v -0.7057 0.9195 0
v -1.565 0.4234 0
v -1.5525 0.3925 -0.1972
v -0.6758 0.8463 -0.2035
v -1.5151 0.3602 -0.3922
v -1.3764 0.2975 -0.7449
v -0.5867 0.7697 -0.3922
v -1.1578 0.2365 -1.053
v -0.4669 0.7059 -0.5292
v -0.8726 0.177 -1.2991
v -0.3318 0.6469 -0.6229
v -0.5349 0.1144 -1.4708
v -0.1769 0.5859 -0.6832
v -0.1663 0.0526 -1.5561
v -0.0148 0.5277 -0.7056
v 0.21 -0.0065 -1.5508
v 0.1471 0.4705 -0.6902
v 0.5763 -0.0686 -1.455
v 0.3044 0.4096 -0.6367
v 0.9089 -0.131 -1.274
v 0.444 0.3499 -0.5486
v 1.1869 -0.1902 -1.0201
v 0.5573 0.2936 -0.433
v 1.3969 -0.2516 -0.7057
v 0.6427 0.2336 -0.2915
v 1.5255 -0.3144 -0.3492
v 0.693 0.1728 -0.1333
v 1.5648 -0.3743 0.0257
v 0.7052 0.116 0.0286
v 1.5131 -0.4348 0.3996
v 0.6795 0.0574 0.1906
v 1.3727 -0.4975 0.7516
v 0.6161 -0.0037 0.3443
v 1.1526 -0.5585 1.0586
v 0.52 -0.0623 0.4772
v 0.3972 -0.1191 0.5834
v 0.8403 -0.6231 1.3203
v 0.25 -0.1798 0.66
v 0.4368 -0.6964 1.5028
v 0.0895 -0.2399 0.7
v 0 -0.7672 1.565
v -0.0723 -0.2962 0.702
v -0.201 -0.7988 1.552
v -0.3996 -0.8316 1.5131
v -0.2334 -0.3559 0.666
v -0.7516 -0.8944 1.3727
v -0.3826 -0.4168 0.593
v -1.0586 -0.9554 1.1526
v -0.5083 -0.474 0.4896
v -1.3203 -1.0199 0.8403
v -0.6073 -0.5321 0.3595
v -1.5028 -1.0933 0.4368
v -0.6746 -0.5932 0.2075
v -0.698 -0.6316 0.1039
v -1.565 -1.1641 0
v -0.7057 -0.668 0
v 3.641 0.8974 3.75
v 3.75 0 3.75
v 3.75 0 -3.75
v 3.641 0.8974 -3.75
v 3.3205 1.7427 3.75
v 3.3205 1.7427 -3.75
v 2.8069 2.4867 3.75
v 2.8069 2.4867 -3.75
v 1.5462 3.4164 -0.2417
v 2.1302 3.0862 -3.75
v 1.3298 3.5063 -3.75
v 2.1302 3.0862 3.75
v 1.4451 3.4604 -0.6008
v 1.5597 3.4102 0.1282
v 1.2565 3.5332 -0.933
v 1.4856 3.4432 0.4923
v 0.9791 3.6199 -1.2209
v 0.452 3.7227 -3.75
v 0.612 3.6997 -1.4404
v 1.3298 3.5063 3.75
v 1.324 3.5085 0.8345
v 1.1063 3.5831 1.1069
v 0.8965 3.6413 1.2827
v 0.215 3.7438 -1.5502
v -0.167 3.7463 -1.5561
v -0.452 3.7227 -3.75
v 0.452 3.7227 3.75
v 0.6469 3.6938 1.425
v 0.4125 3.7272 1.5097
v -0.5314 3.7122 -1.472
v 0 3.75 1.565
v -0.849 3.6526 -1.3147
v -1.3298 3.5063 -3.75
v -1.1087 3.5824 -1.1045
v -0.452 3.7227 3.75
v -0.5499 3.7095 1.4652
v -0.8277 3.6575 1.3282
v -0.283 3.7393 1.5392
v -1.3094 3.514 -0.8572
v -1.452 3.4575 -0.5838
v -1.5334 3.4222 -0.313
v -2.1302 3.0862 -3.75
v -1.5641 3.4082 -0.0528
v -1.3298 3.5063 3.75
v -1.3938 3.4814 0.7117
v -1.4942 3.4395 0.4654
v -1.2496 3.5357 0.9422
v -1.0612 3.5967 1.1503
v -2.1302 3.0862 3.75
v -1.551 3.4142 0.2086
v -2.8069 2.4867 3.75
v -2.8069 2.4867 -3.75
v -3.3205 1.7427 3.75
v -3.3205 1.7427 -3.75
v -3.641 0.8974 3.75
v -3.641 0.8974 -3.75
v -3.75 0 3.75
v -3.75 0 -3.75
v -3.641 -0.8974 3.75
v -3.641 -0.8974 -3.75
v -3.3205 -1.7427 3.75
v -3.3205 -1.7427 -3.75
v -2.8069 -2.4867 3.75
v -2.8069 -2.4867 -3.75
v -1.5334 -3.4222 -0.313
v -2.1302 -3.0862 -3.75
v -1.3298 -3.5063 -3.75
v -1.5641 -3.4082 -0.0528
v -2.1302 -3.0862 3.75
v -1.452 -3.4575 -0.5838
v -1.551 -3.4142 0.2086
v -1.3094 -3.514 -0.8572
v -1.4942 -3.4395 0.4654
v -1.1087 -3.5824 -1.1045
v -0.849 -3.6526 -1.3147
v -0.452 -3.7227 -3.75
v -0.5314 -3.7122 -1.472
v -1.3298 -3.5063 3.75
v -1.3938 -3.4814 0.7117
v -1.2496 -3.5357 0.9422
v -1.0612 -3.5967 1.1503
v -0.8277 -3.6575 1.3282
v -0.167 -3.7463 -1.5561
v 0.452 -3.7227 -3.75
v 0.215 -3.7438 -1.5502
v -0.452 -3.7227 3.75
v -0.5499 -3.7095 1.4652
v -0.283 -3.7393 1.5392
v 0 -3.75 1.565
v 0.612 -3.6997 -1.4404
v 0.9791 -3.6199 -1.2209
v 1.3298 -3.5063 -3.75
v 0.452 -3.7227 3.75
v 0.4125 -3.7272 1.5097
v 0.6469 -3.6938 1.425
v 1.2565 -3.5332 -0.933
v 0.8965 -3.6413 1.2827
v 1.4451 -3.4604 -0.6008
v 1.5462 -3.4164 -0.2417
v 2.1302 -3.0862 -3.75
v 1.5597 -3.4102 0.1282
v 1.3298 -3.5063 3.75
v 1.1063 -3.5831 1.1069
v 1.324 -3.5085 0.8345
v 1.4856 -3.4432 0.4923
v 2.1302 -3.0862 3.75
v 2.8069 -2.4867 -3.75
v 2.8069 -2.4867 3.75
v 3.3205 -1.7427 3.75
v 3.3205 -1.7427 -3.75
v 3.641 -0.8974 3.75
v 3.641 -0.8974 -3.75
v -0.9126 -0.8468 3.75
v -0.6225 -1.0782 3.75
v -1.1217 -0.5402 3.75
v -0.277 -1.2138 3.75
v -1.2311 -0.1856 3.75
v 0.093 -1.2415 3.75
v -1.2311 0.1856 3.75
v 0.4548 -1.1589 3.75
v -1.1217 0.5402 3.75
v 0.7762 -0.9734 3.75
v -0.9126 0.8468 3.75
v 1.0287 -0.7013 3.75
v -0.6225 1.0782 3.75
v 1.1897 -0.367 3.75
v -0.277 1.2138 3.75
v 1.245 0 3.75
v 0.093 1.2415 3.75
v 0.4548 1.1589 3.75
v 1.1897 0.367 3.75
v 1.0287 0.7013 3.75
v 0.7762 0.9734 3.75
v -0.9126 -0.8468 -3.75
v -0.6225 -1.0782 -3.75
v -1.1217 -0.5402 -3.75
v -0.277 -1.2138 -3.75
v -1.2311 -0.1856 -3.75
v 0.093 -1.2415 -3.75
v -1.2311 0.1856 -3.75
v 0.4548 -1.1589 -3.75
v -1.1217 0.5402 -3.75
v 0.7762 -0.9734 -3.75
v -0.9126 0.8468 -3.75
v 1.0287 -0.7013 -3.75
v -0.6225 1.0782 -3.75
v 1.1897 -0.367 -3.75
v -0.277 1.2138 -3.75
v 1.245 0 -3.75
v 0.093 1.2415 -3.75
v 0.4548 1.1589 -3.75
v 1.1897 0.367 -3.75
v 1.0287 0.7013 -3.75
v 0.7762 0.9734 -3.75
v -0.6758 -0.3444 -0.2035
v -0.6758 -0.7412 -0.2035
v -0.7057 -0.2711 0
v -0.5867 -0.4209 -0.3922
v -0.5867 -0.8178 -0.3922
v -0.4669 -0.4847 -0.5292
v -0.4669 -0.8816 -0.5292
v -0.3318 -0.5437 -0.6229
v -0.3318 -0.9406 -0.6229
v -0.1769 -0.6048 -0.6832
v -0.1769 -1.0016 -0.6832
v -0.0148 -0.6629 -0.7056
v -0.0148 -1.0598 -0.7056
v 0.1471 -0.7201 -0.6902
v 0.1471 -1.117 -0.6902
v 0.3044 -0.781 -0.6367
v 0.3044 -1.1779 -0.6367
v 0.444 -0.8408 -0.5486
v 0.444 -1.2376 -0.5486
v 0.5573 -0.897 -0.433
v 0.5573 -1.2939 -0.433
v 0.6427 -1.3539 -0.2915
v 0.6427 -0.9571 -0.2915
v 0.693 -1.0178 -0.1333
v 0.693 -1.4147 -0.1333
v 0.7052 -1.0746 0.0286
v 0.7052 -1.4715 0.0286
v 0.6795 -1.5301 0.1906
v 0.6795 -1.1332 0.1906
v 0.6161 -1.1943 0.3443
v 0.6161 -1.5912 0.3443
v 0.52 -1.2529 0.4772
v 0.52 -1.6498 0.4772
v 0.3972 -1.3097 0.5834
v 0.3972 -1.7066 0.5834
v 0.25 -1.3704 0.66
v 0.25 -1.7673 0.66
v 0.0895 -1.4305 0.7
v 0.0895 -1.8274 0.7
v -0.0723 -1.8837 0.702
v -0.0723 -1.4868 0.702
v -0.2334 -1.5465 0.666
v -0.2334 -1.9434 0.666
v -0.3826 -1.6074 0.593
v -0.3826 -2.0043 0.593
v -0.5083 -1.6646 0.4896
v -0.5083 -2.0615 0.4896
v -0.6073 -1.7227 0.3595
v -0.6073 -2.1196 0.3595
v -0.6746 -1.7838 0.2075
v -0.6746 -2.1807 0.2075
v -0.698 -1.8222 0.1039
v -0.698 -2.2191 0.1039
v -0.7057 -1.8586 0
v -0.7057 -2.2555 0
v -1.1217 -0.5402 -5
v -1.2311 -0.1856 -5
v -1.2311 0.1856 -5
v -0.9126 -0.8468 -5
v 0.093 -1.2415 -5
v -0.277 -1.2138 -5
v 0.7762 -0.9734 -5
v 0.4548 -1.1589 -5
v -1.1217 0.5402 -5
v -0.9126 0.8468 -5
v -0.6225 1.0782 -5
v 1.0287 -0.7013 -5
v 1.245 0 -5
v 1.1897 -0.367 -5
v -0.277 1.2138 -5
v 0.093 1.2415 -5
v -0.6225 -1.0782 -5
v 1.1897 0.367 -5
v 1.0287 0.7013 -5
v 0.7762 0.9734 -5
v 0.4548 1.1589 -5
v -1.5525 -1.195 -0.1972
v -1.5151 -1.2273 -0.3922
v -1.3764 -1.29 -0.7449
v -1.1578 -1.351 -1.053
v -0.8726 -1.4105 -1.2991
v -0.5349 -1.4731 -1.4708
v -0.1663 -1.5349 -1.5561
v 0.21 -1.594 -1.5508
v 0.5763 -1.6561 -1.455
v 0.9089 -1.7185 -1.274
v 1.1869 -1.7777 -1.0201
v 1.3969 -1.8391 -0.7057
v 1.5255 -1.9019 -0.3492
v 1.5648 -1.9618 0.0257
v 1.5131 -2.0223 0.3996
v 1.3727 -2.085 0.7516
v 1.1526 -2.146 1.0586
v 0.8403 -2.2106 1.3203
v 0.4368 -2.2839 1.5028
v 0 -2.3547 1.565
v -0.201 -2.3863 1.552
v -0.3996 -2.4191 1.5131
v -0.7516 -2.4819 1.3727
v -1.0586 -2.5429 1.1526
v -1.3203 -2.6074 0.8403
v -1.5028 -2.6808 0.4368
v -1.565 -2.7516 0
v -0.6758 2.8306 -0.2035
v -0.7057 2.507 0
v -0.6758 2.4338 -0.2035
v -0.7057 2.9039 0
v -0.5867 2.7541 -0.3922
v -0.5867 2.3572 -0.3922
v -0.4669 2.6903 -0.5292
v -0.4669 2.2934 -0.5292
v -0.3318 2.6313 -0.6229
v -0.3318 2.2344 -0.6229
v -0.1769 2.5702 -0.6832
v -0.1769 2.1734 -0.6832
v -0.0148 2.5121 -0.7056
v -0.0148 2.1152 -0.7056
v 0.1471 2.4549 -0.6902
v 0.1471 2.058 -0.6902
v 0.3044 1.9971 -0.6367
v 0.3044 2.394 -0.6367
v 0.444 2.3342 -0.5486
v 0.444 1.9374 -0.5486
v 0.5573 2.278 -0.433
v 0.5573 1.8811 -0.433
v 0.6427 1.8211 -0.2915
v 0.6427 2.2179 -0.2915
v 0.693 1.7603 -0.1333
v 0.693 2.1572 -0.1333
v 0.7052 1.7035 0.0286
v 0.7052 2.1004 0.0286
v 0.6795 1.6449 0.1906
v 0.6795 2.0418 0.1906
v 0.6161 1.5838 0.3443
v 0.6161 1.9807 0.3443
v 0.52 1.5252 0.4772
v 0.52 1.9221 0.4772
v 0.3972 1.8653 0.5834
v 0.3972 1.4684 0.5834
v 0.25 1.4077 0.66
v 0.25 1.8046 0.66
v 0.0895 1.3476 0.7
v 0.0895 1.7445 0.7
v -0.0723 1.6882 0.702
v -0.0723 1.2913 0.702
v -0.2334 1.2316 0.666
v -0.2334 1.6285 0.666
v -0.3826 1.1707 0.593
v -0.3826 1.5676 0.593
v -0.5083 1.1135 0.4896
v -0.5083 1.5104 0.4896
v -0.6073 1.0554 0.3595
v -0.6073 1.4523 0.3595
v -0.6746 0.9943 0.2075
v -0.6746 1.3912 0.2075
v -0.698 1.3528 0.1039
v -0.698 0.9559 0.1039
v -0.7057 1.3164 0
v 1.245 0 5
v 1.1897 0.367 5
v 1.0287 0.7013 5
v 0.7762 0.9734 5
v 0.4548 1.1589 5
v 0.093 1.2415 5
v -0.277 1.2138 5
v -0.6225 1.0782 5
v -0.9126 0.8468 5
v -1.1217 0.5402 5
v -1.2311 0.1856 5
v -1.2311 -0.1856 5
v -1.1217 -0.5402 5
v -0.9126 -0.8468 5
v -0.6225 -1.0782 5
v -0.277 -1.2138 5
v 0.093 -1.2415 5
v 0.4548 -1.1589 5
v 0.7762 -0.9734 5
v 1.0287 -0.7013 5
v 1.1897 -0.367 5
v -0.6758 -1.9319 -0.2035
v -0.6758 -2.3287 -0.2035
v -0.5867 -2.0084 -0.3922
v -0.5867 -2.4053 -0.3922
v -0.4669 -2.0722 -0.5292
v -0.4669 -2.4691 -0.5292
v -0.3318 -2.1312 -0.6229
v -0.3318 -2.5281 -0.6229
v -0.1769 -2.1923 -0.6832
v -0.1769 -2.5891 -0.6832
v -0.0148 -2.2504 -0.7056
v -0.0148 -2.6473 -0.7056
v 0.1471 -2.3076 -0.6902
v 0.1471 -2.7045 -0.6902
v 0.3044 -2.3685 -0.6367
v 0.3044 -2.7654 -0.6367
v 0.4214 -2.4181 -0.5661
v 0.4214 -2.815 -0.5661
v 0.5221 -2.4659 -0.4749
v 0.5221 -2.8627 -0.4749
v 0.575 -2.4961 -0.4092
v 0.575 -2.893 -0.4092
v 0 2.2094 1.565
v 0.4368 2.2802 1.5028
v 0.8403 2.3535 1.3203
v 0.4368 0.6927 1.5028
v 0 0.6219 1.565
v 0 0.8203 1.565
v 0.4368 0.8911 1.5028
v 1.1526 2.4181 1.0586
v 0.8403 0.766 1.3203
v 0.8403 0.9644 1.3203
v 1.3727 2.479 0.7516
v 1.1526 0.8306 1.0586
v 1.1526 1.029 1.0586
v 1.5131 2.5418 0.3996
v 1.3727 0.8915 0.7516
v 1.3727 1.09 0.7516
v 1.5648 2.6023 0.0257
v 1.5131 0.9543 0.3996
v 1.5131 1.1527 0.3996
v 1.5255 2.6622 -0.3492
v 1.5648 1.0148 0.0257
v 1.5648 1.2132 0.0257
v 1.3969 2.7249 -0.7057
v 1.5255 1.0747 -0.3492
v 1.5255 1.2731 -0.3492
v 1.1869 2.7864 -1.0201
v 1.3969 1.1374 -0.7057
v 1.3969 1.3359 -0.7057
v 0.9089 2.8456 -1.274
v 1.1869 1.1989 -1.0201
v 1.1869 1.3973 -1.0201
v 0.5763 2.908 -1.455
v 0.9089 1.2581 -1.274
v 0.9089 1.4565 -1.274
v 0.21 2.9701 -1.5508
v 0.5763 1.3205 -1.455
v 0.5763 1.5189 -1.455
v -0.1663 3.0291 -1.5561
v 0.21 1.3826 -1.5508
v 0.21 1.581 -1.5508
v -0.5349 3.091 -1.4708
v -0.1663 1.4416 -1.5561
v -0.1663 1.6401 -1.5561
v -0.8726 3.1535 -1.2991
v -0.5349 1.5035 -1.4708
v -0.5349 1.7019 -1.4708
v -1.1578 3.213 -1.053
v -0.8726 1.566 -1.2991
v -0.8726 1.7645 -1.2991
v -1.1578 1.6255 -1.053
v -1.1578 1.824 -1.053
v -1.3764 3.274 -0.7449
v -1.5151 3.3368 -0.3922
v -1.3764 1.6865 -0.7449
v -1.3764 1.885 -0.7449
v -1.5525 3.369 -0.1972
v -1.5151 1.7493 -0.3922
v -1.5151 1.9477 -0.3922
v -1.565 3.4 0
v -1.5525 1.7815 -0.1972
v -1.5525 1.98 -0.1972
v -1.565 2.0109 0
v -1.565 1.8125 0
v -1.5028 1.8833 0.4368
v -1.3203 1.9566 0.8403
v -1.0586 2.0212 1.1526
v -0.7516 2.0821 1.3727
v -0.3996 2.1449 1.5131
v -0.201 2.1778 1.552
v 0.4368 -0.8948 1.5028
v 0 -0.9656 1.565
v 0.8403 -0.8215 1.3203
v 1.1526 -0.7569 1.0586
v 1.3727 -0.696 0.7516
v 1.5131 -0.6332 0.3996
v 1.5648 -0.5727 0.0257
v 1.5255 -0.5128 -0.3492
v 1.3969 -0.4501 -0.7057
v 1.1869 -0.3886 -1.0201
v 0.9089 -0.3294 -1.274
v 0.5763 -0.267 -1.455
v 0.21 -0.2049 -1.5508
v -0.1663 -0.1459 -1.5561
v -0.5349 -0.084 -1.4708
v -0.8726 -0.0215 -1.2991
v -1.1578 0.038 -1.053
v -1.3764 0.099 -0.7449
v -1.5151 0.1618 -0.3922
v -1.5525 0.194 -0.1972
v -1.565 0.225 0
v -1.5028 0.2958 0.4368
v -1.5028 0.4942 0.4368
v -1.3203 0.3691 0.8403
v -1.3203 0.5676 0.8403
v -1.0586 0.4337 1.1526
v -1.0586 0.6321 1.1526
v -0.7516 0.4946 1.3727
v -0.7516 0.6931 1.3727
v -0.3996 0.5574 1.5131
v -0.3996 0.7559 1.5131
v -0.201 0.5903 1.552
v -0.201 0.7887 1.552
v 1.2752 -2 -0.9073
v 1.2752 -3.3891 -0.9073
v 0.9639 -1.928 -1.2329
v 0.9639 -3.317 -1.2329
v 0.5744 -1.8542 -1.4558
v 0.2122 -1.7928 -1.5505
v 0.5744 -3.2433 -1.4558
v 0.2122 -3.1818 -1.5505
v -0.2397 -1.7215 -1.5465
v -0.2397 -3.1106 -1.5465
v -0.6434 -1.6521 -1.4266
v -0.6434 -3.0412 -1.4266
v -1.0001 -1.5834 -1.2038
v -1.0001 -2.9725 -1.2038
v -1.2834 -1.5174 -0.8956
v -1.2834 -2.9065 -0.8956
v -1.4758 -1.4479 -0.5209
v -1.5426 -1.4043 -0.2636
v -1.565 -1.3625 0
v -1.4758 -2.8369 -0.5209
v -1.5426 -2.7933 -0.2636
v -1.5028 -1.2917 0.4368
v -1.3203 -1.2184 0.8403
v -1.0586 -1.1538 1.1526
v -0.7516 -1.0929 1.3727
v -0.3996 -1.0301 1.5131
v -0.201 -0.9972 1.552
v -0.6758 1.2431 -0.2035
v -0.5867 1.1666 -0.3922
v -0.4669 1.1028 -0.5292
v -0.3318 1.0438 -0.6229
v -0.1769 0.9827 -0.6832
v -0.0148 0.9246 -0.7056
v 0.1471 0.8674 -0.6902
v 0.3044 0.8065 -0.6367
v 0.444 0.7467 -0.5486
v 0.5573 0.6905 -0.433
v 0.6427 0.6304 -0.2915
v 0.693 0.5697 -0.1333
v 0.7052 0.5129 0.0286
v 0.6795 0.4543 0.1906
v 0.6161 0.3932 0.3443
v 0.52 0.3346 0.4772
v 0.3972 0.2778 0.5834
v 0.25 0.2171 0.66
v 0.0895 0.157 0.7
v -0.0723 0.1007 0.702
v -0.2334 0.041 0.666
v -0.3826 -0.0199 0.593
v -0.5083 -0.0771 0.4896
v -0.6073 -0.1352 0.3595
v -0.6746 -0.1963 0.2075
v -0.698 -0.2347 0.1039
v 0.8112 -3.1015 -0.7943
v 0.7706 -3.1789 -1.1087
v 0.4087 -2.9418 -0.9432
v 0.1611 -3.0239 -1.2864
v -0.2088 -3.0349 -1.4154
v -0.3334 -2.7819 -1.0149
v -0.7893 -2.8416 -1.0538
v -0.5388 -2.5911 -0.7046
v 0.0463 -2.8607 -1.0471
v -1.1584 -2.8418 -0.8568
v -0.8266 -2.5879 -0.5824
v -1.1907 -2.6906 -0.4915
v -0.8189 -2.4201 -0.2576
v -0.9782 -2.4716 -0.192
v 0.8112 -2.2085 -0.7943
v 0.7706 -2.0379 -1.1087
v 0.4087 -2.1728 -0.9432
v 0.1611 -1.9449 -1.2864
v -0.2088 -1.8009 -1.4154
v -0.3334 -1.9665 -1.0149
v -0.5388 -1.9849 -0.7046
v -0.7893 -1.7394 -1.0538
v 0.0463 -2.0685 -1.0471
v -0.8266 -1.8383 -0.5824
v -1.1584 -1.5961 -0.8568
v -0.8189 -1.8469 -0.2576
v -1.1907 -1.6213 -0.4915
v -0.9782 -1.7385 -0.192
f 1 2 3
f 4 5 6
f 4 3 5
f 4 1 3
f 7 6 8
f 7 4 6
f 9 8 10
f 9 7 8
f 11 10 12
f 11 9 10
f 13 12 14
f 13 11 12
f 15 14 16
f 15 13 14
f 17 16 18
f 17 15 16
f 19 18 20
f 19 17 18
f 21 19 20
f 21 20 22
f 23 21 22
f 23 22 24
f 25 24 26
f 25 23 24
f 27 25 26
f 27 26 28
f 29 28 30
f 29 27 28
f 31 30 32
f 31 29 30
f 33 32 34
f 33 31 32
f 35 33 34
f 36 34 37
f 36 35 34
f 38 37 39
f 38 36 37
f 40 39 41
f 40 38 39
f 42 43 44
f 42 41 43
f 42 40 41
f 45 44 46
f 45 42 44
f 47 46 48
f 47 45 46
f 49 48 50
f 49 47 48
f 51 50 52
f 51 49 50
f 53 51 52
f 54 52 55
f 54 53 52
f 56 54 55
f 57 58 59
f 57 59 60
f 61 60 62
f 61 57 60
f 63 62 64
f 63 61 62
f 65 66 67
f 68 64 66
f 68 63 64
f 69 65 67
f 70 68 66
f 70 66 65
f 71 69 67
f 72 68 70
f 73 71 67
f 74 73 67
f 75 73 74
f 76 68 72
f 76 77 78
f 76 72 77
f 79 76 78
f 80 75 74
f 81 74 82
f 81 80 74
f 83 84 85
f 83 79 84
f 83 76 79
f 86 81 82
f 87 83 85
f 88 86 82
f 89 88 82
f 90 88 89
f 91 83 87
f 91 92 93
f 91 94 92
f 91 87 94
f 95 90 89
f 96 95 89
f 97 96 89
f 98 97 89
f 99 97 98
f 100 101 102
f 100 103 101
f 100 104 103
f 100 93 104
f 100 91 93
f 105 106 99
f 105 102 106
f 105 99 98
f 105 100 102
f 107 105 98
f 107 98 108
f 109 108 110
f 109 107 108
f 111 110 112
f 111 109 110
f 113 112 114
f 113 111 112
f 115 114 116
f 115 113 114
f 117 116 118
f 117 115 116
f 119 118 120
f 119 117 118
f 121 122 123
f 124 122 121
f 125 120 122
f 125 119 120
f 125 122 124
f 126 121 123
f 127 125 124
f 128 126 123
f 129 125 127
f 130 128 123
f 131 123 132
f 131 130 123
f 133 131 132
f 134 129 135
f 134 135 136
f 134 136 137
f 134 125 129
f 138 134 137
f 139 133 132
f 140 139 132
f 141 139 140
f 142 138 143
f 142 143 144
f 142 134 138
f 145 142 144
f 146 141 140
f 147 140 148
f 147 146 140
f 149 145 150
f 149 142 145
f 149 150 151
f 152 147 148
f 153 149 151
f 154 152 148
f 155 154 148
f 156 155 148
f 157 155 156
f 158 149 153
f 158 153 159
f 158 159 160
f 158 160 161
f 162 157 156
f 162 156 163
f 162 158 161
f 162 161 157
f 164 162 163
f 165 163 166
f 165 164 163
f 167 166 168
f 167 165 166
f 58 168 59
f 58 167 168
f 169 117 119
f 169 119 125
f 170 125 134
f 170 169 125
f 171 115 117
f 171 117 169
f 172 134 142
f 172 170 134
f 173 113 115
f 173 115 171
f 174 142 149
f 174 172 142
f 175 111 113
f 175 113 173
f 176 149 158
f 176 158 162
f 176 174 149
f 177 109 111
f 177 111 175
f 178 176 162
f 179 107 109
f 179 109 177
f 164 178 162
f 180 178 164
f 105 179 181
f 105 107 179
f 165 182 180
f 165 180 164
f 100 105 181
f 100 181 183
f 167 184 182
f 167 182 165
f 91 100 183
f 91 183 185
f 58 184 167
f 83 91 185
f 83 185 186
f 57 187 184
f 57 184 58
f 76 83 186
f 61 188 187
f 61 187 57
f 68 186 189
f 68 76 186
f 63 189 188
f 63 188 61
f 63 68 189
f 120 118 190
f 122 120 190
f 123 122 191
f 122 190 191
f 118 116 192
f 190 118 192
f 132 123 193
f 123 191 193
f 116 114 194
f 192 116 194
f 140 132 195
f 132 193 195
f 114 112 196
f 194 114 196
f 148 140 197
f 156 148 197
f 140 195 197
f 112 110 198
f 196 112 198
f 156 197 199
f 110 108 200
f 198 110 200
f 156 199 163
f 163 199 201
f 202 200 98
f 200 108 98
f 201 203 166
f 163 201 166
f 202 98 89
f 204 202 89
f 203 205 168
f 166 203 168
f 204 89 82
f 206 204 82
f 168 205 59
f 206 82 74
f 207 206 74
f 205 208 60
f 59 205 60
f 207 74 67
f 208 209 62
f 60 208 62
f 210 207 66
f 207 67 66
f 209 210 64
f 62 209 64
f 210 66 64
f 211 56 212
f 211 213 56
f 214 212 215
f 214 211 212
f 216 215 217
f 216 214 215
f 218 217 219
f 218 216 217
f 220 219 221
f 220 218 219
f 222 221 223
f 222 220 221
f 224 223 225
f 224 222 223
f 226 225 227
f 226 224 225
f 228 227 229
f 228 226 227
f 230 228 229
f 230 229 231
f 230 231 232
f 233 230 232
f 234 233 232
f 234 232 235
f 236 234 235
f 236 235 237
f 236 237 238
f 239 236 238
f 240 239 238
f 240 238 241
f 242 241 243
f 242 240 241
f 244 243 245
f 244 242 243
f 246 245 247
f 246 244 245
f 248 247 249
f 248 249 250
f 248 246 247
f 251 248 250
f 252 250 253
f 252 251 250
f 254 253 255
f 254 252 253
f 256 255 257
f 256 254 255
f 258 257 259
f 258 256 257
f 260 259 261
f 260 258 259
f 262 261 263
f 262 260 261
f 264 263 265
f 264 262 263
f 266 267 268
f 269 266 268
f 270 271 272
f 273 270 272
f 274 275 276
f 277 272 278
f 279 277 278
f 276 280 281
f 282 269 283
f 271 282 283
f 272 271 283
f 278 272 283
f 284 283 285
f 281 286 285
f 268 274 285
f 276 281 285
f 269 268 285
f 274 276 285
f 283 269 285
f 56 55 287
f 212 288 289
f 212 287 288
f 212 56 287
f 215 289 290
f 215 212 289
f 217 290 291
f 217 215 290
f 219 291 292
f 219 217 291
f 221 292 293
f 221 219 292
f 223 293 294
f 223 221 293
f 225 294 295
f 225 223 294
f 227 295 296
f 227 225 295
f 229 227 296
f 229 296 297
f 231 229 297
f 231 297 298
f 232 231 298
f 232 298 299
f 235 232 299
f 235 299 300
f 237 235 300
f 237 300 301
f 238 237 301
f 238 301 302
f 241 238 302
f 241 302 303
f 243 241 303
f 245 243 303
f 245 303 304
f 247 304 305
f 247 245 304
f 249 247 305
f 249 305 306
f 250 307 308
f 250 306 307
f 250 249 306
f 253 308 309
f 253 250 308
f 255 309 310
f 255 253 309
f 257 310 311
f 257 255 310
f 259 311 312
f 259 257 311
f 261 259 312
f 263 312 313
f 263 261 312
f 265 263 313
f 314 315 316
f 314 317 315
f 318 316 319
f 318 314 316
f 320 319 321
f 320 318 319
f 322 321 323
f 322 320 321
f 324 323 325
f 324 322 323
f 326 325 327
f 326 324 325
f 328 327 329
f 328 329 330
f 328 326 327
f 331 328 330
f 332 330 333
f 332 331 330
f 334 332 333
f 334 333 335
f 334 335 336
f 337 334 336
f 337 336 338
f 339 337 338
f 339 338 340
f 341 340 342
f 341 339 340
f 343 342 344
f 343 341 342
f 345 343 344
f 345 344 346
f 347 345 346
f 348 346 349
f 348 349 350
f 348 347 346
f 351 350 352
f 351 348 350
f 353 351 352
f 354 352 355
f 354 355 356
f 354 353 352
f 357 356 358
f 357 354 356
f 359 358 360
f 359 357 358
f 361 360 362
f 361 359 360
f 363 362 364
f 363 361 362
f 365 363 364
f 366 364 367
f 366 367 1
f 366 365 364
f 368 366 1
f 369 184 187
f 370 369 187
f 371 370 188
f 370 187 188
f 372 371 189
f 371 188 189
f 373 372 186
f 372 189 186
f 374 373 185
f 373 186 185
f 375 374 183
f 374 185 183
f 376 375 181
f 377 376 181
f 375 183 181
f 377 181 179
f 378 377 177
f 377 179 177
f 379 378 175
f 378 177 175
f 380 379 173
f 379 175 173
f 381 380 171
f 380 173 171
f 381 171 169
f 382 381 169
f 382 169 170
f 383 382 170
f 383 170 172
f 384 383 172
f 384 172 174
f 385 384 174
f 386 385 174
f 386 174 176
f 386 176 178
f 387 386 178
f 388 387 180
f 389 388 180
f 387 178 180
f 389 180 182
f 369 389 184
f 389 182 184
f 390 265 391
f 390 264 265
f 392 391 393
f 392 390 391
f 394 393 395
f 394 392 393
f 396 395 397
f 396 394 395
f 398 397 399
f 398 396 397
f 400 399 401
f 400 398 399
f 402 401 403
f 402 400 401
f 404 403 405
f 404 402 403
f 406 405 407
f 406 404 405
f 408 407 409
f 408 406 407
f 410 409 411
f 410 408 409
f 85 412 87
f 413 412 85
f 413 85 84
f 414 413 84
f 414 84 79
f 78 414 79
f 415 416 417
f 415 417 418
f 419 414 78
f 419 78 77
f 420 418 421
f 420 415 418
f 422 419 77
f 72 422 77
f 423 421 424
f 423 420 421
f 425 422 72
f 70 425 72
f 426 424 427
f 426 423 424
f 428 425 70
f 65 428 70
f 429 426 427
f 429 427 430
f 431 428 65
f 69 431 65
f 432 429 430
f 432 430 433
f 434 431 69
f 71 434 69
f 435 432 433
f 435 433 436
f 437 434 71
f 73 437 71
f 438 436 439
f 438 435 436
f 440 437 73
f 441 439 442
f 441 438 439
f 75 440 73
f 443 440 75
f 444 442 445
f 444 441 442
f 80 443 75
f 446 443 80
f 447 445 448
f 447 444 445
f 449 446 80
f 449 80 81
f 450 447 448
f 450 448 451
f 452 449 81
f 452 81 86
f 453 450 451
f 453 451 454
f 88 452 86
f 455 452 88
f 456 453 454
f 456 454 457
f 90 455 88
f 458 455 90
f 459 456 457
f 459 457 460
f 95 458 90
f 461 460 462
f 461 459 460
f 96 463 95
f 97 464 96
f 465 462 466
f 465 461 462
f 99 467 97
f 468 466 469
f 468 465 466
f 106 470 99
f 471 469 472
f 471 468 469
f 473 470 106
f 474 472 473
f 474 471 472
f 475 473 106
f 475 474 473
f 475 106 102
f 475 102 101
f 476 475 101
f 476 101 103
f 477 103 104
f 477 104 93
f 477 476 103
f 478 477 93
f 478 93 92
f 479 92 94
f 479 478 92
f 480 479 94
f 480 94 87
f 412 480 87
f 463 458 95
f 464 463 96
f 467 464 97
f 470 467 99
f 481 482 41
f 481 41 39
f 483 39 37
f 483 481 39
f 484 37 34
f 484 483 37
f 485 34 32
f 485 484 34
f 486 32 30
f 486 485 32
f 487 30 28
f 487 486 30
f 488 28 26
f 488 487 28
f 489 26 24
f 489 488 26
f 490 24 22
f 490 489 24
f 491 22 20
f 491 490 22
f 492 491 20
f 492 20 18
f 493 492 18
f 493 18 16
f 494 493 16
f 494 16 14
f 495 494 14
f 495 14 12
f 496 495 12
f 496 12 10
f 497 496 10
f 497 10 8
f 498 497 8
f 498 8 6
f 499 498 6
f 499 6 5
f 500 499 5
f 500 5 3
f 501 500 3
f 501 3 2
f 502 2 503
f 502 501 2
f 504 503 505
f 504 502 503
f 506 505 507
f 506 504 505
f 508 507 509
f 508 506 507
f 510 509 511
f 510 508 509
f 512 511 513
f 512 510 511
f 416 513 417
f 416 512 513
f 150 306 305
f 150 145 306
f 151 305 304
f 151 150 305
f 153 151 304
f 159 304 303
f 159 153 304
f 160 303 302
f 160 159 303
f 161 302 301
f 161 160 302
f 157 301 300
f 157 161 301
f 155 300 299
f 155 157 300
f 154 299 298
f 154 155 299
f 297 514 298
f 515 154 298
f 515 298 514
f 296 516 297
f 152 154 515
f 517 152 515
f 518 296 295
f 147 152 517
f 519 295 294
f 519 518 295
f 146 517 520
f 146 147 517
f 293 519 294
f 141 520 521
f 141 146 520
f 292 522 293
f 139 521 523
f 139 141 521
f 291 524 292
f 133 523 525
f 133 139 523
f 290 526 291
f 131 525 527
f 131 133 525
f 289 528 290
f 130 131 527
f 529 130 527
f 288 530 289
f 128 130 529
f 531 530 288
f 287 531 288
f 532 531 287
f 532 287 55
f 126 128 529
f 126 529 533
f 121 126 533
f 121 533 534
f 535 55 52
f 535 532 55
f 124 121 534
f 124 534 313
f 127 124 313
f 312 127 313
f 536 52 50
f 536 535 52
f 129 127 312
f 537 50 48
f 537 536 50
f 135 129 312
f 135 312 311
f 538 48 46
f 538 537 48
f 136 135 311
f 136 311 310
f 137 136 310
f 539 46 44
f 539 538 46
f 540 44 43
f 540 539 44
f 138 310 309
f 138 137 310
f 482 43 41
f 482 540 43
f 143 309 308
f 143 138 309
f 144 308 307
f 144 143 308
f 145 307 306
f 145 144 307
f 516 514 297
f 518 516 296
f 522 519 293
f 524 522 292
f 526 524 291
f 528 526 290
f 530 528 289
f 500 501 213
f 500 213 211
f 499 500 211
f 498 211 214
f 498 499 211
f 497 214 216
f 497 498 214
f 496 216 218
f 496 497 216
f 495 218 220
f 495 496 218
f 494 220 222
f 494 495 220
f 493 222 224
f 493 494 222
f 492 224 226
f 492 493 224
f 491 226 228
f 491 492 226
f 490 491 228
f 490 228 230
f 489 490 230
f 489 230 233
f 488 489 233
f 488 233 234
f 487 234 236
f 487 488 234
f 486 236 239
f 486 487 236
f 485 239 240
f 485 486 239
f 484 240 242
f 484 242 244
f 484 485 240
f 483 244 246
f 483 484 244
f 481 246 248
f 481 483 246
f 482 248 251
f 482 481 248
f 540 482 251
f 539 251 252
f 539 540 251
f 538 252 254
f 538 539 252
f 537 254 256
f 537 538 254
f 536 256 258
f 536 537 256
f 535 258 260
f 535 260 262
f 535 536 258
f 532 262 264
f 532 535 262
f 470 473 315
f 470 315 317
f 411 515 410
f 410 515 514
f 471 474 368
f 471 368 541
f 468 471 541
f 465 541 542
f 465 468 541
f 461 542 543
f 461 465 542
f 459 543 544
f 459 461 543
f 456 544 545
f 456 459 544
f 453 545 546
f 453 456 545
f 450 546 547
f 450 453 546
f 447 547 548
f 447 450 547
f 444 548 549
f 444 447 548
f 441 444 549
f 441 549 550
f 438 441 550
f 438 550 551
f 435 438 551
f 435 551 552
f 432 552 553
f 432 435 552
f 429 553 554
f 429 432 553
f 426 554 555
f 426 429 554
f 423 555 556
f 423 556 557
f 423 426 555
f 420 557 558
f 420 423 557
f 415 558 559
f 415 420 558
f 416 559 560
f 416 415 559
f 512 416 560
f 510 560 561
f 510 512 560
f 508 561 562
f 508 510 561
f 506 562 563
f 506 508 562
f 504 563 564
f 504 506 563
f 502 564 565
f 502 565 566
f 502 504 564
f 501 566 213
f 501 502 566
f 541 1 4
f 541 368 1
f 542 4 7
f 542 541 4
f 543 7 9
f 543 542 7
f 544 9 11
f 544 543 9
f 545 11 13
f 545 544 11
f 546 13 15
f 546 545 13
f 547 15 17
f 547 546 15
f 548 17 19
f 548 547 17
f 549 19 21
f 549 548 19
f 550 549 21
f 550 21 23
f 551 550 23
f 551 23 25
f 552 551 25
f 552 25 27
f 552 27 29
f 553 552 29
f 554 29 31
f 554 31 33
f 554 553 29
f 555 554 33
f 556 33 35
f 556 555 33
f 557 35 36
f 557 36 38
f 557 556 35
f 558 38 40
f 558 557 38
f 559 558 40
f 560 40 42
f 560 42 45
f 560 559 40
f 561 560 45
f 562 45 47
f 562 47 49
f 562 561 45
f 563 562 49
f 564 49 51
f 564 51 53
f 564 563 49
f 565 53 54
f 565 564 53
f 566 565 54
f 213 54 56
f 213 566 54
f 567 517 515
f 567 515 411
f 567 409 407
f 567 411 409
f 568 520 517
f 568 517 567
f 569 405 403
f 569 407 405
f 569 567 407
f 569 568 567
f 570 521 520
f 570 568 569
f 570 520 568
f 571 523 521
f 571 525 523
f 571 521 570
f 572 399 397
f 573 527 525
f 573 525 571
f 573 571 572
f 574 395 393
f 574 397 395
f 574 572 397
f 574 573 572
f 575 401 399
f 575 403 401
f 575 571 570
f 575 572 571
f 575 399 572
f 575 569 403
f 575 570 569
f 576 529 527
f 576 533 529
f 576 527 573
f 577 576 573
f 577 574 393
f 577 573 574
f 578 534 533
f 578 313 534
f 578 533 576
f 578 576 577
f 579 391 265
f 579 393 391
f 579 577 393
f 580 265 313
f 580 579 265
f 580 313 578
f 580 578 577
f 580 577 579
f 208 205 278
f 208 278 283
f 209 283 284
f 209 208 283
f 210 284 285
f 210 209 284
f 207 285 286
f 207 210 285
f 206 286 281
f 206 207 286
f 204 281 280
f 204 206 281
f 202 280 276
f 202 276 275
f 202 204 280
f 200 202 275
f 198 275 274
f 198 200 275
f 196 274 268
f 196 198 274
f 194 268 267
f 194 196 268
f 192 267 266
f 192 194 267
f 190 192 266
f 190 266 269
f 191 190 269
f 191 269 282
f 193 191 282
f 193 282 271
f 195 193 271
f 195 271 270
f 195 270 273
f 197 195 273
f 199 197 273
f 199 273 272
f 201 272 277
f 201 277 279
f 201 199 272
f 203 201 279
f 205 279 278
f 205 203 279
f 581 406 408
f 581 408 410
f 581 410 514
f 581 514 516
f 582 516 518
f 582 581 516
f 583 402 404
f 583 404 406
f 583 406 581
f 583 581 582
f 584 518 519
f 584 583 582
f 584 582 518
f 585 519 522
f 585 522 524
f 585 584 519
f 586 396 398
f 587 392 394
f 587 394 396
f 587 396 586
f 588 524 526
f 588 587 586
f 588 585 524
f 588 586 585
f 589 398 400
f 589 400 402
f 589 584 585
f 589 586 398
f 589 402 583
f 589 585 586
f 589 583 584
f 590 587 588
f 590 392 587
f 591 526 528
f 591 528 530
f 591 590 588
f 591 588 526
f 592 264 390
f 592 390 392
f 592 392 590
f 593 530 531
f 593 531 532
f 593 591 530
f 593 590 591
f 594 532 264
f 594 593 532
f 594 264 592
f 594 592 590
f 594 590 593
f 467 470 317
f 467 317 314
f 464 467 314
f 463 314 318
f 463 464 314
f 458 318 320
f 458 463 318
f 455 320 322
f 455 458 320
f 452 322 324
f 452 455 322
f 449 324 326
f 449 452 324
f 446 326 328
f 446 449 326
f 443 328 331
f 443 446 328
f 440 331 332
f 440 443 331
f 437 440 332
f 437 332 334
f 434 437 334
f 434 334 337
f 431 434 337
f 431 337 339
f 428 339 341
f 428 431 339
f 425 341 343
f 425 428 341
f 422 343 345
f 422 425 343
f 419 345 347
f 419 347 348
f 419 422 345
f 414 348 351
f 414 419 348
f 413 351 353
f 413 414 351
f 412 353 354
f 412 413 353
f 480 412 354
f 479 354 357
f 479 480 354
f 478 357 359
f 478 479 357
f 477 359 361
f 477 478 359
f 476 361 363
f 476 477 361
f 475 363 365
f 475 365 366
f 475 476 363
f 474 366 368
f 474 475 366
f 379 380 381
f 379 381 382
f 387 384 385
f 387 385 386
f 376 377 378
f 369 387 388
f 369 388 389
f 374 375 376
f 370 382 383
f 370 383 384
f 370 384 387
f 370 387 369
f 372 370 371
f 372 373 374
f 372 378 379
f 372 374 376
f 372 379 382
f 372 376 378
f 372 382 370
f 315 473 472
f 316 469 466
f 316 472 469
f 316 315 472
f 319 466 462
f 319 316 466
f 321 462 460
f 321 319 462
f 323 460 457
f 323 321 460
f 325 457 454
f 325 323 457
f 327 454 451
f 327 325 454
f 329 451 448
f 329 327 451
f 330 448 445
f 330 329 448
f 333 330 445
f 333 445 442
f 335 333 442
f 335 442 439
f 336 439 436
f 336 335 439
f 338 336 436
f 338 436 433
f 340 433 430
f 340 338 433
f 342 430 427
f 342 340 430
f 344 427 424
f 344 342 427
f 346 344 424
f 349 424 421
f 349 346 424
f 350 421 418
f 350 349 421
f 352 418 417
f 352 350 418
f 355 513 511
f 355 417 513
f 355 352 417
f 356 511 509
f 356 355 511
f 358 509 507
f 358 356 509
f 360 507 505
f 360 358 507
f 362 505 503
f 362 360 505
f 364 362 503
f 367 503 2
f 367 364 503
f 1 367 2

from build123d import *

# Parameters (mm, degrees)
SKETCH2_R               = 3.75
BOSS_EXTRUDE1_DEPTH     = 3.75
SKETCH3_R               = 1.245
BOSS_EXTRUDE3_DEPTH     = 1.25
CUT_EXTRUDE2_DEPTH      = 8.288689869
CUT_EXTRUDE2_DEPTH_BACK = 8.288689869
SKETCH4_R               = 1.565
THREAD2_PITCH           = 1.5875


with BuildPart() as part:
    # Sketch2 → Boss-Extrude1 (new, symmetric)
    with BuildSketch(Plane.XY):
        Circle(SKETCH2_R)
    extrude(amount=BOSS_EXTRUDE1_DEPTH, both=True)

    # Sketch3 → Boss-Extrude3 (add)
    with BuildSketch(Plane.XY.offset(3.75)):
        Circle(SKETCH3_R)
    boss_extrude3 = extrude(amount=BOSS_EXTRUDE3_DEPTH)

    # Mirror1: Boss-Extrude3 across plane
    add(boss_extrude3.mirror(Plane.XY))

    # Sketch4 → Cut-Extrude2 (cut, two sides: drawn at the far end of the back side and taken through both)
    with BuildSketch(Plane(origin=(0, 0, 0), x_dir=(1, 0, 0), z_dir=(0, 1, 0)).offset(-CUT_EXTRUDE2_DEPTH_BACK)):
        with Locations(Location((0, 0, 0), (0, 0, 270))):
            Circle(SKETCH4_R)
    extrude(amount=CUT_EXTRUDE2_DEPTH + CUT_EXTRUDE2_DEPTH_BACK, mode=Mode.SUBTRACT)

    # Thread2: the profile of Thread Profile3 profile screwed along a right-hand helix of 3.401575 turns, 8 arcs to a turn; built about Z, then put on its axis
    thread2_z = Axis((0, 0, 0), (0, 0, 1))
    thread2_corners = [(1.5653, 0, -0.000173205), (1.5653, 0, 1.389235701), (0.705740423, 0, 0.892968748), (0.705740423, 0, 0.496093748)]
    with BuildLine(mode=Mode.PRIVATE) as thread2_profile:
        Line(thread2_corners[0], thread2_corners[1])
        Line(thread2_corners[1], thread2_corners[2])
        Line(thread2_corners[2], thread2_corners[3])
        Line(thread2_corners[3], thread2_corners[0])
    thread2_cap = Face(thread2_profile.wire())
    thread2_turn_angles = [0, 22.5, 45, 67.5, 90, 112.5, 135, 157.5, 180, 202.5, 225, 247.5, 270, 292.5, 315, 337.5, 360]
    thread2_turn_weights = [1, 0.9238795325112867, 1, 0.9238795325112867, 1, 0.9238795325112867, 1, 0.9238795325112867, 1, 0.9238795325112867, 1, 0.9238795325112867, 1, 0.9238795325112867, 1, 0.9238795325112867, 1]
    thread2_turn_rails = [Edge.make_bspline([Vector(p[0], p[1], 0).rotate(thread2_z, thread2_turn_angles[k]) / thread2_turn_weights[k] + Vector(0, 0, p[2] + THREAD2_PITCH * thread2_turn_angles[k] / 360) for k in range(17)], [0, 0, 0, 1, 1, 2, 2, 3, 3, 4, 4, 5, 5, 6, 6, 7, 7, 8, 8, 8], 2, thread2_turn_weights) for p in thread2_corners]
    thread2_turn_sides = [Face.make_surface_from_curves(thread2_turn_rails[p[0]], thread2_turn_rails[p[1]]) for p in [(0, 1), (1, 2), (2, 3), (3, 0)]]
    thread2_last_angles = [1080, 1102.5, 1125, 1147.5, 1170, 1192.5, 1215, 1219.783464567, 1224.566929134]
    thread2_last_weights = [1, 0.9238795325112867, 1, 0.9238795325112867, 1, 0.9238795325112867, 1, 0.9965169669882292, 1]
    thread2_last_rails = [Edge.make_bspline([Vector(p[0], p[1], 0).rotate(thread2_z, thread2_last_angles[k]) / thread2_last_weights[k] + Vector(0, 0, p[2] + THREAD2_PITCH * thread2_last_angles[k] / 360) for k in range(9)], [0, 0, 0, 1, 1, 2, 2, 3, 3, 4, 4, 4], 2, thread2_last_weights) for p in thread2_corners]
    thread2_last_sides = [Face.make_surface_from_curves(thread2_last_rails[p[0]], thread2_last_rails[p[1]]) for p in [(0, 1), (1, 2), (2, 3), (3, 0)]]
    thread2 = Plane(origin=(0, 3.4, 0), x_dir=(-1, 0, 0), z_dir=(0, -1, 0)) * Solid(Shell([*[p.moved(Location((0, 0, THREAD2_PITCH * i))) for i in range(3) for p in thread2_turn_sides], *thread2_last_sides, thread2_cap, thread2_cap.rotate(thread2_z, 1224.566929134).moved(Location((0, 0, THREAD2_PITCH * 1224.566929134 / 360)))]))
    add(thread2)


solid = part.part
